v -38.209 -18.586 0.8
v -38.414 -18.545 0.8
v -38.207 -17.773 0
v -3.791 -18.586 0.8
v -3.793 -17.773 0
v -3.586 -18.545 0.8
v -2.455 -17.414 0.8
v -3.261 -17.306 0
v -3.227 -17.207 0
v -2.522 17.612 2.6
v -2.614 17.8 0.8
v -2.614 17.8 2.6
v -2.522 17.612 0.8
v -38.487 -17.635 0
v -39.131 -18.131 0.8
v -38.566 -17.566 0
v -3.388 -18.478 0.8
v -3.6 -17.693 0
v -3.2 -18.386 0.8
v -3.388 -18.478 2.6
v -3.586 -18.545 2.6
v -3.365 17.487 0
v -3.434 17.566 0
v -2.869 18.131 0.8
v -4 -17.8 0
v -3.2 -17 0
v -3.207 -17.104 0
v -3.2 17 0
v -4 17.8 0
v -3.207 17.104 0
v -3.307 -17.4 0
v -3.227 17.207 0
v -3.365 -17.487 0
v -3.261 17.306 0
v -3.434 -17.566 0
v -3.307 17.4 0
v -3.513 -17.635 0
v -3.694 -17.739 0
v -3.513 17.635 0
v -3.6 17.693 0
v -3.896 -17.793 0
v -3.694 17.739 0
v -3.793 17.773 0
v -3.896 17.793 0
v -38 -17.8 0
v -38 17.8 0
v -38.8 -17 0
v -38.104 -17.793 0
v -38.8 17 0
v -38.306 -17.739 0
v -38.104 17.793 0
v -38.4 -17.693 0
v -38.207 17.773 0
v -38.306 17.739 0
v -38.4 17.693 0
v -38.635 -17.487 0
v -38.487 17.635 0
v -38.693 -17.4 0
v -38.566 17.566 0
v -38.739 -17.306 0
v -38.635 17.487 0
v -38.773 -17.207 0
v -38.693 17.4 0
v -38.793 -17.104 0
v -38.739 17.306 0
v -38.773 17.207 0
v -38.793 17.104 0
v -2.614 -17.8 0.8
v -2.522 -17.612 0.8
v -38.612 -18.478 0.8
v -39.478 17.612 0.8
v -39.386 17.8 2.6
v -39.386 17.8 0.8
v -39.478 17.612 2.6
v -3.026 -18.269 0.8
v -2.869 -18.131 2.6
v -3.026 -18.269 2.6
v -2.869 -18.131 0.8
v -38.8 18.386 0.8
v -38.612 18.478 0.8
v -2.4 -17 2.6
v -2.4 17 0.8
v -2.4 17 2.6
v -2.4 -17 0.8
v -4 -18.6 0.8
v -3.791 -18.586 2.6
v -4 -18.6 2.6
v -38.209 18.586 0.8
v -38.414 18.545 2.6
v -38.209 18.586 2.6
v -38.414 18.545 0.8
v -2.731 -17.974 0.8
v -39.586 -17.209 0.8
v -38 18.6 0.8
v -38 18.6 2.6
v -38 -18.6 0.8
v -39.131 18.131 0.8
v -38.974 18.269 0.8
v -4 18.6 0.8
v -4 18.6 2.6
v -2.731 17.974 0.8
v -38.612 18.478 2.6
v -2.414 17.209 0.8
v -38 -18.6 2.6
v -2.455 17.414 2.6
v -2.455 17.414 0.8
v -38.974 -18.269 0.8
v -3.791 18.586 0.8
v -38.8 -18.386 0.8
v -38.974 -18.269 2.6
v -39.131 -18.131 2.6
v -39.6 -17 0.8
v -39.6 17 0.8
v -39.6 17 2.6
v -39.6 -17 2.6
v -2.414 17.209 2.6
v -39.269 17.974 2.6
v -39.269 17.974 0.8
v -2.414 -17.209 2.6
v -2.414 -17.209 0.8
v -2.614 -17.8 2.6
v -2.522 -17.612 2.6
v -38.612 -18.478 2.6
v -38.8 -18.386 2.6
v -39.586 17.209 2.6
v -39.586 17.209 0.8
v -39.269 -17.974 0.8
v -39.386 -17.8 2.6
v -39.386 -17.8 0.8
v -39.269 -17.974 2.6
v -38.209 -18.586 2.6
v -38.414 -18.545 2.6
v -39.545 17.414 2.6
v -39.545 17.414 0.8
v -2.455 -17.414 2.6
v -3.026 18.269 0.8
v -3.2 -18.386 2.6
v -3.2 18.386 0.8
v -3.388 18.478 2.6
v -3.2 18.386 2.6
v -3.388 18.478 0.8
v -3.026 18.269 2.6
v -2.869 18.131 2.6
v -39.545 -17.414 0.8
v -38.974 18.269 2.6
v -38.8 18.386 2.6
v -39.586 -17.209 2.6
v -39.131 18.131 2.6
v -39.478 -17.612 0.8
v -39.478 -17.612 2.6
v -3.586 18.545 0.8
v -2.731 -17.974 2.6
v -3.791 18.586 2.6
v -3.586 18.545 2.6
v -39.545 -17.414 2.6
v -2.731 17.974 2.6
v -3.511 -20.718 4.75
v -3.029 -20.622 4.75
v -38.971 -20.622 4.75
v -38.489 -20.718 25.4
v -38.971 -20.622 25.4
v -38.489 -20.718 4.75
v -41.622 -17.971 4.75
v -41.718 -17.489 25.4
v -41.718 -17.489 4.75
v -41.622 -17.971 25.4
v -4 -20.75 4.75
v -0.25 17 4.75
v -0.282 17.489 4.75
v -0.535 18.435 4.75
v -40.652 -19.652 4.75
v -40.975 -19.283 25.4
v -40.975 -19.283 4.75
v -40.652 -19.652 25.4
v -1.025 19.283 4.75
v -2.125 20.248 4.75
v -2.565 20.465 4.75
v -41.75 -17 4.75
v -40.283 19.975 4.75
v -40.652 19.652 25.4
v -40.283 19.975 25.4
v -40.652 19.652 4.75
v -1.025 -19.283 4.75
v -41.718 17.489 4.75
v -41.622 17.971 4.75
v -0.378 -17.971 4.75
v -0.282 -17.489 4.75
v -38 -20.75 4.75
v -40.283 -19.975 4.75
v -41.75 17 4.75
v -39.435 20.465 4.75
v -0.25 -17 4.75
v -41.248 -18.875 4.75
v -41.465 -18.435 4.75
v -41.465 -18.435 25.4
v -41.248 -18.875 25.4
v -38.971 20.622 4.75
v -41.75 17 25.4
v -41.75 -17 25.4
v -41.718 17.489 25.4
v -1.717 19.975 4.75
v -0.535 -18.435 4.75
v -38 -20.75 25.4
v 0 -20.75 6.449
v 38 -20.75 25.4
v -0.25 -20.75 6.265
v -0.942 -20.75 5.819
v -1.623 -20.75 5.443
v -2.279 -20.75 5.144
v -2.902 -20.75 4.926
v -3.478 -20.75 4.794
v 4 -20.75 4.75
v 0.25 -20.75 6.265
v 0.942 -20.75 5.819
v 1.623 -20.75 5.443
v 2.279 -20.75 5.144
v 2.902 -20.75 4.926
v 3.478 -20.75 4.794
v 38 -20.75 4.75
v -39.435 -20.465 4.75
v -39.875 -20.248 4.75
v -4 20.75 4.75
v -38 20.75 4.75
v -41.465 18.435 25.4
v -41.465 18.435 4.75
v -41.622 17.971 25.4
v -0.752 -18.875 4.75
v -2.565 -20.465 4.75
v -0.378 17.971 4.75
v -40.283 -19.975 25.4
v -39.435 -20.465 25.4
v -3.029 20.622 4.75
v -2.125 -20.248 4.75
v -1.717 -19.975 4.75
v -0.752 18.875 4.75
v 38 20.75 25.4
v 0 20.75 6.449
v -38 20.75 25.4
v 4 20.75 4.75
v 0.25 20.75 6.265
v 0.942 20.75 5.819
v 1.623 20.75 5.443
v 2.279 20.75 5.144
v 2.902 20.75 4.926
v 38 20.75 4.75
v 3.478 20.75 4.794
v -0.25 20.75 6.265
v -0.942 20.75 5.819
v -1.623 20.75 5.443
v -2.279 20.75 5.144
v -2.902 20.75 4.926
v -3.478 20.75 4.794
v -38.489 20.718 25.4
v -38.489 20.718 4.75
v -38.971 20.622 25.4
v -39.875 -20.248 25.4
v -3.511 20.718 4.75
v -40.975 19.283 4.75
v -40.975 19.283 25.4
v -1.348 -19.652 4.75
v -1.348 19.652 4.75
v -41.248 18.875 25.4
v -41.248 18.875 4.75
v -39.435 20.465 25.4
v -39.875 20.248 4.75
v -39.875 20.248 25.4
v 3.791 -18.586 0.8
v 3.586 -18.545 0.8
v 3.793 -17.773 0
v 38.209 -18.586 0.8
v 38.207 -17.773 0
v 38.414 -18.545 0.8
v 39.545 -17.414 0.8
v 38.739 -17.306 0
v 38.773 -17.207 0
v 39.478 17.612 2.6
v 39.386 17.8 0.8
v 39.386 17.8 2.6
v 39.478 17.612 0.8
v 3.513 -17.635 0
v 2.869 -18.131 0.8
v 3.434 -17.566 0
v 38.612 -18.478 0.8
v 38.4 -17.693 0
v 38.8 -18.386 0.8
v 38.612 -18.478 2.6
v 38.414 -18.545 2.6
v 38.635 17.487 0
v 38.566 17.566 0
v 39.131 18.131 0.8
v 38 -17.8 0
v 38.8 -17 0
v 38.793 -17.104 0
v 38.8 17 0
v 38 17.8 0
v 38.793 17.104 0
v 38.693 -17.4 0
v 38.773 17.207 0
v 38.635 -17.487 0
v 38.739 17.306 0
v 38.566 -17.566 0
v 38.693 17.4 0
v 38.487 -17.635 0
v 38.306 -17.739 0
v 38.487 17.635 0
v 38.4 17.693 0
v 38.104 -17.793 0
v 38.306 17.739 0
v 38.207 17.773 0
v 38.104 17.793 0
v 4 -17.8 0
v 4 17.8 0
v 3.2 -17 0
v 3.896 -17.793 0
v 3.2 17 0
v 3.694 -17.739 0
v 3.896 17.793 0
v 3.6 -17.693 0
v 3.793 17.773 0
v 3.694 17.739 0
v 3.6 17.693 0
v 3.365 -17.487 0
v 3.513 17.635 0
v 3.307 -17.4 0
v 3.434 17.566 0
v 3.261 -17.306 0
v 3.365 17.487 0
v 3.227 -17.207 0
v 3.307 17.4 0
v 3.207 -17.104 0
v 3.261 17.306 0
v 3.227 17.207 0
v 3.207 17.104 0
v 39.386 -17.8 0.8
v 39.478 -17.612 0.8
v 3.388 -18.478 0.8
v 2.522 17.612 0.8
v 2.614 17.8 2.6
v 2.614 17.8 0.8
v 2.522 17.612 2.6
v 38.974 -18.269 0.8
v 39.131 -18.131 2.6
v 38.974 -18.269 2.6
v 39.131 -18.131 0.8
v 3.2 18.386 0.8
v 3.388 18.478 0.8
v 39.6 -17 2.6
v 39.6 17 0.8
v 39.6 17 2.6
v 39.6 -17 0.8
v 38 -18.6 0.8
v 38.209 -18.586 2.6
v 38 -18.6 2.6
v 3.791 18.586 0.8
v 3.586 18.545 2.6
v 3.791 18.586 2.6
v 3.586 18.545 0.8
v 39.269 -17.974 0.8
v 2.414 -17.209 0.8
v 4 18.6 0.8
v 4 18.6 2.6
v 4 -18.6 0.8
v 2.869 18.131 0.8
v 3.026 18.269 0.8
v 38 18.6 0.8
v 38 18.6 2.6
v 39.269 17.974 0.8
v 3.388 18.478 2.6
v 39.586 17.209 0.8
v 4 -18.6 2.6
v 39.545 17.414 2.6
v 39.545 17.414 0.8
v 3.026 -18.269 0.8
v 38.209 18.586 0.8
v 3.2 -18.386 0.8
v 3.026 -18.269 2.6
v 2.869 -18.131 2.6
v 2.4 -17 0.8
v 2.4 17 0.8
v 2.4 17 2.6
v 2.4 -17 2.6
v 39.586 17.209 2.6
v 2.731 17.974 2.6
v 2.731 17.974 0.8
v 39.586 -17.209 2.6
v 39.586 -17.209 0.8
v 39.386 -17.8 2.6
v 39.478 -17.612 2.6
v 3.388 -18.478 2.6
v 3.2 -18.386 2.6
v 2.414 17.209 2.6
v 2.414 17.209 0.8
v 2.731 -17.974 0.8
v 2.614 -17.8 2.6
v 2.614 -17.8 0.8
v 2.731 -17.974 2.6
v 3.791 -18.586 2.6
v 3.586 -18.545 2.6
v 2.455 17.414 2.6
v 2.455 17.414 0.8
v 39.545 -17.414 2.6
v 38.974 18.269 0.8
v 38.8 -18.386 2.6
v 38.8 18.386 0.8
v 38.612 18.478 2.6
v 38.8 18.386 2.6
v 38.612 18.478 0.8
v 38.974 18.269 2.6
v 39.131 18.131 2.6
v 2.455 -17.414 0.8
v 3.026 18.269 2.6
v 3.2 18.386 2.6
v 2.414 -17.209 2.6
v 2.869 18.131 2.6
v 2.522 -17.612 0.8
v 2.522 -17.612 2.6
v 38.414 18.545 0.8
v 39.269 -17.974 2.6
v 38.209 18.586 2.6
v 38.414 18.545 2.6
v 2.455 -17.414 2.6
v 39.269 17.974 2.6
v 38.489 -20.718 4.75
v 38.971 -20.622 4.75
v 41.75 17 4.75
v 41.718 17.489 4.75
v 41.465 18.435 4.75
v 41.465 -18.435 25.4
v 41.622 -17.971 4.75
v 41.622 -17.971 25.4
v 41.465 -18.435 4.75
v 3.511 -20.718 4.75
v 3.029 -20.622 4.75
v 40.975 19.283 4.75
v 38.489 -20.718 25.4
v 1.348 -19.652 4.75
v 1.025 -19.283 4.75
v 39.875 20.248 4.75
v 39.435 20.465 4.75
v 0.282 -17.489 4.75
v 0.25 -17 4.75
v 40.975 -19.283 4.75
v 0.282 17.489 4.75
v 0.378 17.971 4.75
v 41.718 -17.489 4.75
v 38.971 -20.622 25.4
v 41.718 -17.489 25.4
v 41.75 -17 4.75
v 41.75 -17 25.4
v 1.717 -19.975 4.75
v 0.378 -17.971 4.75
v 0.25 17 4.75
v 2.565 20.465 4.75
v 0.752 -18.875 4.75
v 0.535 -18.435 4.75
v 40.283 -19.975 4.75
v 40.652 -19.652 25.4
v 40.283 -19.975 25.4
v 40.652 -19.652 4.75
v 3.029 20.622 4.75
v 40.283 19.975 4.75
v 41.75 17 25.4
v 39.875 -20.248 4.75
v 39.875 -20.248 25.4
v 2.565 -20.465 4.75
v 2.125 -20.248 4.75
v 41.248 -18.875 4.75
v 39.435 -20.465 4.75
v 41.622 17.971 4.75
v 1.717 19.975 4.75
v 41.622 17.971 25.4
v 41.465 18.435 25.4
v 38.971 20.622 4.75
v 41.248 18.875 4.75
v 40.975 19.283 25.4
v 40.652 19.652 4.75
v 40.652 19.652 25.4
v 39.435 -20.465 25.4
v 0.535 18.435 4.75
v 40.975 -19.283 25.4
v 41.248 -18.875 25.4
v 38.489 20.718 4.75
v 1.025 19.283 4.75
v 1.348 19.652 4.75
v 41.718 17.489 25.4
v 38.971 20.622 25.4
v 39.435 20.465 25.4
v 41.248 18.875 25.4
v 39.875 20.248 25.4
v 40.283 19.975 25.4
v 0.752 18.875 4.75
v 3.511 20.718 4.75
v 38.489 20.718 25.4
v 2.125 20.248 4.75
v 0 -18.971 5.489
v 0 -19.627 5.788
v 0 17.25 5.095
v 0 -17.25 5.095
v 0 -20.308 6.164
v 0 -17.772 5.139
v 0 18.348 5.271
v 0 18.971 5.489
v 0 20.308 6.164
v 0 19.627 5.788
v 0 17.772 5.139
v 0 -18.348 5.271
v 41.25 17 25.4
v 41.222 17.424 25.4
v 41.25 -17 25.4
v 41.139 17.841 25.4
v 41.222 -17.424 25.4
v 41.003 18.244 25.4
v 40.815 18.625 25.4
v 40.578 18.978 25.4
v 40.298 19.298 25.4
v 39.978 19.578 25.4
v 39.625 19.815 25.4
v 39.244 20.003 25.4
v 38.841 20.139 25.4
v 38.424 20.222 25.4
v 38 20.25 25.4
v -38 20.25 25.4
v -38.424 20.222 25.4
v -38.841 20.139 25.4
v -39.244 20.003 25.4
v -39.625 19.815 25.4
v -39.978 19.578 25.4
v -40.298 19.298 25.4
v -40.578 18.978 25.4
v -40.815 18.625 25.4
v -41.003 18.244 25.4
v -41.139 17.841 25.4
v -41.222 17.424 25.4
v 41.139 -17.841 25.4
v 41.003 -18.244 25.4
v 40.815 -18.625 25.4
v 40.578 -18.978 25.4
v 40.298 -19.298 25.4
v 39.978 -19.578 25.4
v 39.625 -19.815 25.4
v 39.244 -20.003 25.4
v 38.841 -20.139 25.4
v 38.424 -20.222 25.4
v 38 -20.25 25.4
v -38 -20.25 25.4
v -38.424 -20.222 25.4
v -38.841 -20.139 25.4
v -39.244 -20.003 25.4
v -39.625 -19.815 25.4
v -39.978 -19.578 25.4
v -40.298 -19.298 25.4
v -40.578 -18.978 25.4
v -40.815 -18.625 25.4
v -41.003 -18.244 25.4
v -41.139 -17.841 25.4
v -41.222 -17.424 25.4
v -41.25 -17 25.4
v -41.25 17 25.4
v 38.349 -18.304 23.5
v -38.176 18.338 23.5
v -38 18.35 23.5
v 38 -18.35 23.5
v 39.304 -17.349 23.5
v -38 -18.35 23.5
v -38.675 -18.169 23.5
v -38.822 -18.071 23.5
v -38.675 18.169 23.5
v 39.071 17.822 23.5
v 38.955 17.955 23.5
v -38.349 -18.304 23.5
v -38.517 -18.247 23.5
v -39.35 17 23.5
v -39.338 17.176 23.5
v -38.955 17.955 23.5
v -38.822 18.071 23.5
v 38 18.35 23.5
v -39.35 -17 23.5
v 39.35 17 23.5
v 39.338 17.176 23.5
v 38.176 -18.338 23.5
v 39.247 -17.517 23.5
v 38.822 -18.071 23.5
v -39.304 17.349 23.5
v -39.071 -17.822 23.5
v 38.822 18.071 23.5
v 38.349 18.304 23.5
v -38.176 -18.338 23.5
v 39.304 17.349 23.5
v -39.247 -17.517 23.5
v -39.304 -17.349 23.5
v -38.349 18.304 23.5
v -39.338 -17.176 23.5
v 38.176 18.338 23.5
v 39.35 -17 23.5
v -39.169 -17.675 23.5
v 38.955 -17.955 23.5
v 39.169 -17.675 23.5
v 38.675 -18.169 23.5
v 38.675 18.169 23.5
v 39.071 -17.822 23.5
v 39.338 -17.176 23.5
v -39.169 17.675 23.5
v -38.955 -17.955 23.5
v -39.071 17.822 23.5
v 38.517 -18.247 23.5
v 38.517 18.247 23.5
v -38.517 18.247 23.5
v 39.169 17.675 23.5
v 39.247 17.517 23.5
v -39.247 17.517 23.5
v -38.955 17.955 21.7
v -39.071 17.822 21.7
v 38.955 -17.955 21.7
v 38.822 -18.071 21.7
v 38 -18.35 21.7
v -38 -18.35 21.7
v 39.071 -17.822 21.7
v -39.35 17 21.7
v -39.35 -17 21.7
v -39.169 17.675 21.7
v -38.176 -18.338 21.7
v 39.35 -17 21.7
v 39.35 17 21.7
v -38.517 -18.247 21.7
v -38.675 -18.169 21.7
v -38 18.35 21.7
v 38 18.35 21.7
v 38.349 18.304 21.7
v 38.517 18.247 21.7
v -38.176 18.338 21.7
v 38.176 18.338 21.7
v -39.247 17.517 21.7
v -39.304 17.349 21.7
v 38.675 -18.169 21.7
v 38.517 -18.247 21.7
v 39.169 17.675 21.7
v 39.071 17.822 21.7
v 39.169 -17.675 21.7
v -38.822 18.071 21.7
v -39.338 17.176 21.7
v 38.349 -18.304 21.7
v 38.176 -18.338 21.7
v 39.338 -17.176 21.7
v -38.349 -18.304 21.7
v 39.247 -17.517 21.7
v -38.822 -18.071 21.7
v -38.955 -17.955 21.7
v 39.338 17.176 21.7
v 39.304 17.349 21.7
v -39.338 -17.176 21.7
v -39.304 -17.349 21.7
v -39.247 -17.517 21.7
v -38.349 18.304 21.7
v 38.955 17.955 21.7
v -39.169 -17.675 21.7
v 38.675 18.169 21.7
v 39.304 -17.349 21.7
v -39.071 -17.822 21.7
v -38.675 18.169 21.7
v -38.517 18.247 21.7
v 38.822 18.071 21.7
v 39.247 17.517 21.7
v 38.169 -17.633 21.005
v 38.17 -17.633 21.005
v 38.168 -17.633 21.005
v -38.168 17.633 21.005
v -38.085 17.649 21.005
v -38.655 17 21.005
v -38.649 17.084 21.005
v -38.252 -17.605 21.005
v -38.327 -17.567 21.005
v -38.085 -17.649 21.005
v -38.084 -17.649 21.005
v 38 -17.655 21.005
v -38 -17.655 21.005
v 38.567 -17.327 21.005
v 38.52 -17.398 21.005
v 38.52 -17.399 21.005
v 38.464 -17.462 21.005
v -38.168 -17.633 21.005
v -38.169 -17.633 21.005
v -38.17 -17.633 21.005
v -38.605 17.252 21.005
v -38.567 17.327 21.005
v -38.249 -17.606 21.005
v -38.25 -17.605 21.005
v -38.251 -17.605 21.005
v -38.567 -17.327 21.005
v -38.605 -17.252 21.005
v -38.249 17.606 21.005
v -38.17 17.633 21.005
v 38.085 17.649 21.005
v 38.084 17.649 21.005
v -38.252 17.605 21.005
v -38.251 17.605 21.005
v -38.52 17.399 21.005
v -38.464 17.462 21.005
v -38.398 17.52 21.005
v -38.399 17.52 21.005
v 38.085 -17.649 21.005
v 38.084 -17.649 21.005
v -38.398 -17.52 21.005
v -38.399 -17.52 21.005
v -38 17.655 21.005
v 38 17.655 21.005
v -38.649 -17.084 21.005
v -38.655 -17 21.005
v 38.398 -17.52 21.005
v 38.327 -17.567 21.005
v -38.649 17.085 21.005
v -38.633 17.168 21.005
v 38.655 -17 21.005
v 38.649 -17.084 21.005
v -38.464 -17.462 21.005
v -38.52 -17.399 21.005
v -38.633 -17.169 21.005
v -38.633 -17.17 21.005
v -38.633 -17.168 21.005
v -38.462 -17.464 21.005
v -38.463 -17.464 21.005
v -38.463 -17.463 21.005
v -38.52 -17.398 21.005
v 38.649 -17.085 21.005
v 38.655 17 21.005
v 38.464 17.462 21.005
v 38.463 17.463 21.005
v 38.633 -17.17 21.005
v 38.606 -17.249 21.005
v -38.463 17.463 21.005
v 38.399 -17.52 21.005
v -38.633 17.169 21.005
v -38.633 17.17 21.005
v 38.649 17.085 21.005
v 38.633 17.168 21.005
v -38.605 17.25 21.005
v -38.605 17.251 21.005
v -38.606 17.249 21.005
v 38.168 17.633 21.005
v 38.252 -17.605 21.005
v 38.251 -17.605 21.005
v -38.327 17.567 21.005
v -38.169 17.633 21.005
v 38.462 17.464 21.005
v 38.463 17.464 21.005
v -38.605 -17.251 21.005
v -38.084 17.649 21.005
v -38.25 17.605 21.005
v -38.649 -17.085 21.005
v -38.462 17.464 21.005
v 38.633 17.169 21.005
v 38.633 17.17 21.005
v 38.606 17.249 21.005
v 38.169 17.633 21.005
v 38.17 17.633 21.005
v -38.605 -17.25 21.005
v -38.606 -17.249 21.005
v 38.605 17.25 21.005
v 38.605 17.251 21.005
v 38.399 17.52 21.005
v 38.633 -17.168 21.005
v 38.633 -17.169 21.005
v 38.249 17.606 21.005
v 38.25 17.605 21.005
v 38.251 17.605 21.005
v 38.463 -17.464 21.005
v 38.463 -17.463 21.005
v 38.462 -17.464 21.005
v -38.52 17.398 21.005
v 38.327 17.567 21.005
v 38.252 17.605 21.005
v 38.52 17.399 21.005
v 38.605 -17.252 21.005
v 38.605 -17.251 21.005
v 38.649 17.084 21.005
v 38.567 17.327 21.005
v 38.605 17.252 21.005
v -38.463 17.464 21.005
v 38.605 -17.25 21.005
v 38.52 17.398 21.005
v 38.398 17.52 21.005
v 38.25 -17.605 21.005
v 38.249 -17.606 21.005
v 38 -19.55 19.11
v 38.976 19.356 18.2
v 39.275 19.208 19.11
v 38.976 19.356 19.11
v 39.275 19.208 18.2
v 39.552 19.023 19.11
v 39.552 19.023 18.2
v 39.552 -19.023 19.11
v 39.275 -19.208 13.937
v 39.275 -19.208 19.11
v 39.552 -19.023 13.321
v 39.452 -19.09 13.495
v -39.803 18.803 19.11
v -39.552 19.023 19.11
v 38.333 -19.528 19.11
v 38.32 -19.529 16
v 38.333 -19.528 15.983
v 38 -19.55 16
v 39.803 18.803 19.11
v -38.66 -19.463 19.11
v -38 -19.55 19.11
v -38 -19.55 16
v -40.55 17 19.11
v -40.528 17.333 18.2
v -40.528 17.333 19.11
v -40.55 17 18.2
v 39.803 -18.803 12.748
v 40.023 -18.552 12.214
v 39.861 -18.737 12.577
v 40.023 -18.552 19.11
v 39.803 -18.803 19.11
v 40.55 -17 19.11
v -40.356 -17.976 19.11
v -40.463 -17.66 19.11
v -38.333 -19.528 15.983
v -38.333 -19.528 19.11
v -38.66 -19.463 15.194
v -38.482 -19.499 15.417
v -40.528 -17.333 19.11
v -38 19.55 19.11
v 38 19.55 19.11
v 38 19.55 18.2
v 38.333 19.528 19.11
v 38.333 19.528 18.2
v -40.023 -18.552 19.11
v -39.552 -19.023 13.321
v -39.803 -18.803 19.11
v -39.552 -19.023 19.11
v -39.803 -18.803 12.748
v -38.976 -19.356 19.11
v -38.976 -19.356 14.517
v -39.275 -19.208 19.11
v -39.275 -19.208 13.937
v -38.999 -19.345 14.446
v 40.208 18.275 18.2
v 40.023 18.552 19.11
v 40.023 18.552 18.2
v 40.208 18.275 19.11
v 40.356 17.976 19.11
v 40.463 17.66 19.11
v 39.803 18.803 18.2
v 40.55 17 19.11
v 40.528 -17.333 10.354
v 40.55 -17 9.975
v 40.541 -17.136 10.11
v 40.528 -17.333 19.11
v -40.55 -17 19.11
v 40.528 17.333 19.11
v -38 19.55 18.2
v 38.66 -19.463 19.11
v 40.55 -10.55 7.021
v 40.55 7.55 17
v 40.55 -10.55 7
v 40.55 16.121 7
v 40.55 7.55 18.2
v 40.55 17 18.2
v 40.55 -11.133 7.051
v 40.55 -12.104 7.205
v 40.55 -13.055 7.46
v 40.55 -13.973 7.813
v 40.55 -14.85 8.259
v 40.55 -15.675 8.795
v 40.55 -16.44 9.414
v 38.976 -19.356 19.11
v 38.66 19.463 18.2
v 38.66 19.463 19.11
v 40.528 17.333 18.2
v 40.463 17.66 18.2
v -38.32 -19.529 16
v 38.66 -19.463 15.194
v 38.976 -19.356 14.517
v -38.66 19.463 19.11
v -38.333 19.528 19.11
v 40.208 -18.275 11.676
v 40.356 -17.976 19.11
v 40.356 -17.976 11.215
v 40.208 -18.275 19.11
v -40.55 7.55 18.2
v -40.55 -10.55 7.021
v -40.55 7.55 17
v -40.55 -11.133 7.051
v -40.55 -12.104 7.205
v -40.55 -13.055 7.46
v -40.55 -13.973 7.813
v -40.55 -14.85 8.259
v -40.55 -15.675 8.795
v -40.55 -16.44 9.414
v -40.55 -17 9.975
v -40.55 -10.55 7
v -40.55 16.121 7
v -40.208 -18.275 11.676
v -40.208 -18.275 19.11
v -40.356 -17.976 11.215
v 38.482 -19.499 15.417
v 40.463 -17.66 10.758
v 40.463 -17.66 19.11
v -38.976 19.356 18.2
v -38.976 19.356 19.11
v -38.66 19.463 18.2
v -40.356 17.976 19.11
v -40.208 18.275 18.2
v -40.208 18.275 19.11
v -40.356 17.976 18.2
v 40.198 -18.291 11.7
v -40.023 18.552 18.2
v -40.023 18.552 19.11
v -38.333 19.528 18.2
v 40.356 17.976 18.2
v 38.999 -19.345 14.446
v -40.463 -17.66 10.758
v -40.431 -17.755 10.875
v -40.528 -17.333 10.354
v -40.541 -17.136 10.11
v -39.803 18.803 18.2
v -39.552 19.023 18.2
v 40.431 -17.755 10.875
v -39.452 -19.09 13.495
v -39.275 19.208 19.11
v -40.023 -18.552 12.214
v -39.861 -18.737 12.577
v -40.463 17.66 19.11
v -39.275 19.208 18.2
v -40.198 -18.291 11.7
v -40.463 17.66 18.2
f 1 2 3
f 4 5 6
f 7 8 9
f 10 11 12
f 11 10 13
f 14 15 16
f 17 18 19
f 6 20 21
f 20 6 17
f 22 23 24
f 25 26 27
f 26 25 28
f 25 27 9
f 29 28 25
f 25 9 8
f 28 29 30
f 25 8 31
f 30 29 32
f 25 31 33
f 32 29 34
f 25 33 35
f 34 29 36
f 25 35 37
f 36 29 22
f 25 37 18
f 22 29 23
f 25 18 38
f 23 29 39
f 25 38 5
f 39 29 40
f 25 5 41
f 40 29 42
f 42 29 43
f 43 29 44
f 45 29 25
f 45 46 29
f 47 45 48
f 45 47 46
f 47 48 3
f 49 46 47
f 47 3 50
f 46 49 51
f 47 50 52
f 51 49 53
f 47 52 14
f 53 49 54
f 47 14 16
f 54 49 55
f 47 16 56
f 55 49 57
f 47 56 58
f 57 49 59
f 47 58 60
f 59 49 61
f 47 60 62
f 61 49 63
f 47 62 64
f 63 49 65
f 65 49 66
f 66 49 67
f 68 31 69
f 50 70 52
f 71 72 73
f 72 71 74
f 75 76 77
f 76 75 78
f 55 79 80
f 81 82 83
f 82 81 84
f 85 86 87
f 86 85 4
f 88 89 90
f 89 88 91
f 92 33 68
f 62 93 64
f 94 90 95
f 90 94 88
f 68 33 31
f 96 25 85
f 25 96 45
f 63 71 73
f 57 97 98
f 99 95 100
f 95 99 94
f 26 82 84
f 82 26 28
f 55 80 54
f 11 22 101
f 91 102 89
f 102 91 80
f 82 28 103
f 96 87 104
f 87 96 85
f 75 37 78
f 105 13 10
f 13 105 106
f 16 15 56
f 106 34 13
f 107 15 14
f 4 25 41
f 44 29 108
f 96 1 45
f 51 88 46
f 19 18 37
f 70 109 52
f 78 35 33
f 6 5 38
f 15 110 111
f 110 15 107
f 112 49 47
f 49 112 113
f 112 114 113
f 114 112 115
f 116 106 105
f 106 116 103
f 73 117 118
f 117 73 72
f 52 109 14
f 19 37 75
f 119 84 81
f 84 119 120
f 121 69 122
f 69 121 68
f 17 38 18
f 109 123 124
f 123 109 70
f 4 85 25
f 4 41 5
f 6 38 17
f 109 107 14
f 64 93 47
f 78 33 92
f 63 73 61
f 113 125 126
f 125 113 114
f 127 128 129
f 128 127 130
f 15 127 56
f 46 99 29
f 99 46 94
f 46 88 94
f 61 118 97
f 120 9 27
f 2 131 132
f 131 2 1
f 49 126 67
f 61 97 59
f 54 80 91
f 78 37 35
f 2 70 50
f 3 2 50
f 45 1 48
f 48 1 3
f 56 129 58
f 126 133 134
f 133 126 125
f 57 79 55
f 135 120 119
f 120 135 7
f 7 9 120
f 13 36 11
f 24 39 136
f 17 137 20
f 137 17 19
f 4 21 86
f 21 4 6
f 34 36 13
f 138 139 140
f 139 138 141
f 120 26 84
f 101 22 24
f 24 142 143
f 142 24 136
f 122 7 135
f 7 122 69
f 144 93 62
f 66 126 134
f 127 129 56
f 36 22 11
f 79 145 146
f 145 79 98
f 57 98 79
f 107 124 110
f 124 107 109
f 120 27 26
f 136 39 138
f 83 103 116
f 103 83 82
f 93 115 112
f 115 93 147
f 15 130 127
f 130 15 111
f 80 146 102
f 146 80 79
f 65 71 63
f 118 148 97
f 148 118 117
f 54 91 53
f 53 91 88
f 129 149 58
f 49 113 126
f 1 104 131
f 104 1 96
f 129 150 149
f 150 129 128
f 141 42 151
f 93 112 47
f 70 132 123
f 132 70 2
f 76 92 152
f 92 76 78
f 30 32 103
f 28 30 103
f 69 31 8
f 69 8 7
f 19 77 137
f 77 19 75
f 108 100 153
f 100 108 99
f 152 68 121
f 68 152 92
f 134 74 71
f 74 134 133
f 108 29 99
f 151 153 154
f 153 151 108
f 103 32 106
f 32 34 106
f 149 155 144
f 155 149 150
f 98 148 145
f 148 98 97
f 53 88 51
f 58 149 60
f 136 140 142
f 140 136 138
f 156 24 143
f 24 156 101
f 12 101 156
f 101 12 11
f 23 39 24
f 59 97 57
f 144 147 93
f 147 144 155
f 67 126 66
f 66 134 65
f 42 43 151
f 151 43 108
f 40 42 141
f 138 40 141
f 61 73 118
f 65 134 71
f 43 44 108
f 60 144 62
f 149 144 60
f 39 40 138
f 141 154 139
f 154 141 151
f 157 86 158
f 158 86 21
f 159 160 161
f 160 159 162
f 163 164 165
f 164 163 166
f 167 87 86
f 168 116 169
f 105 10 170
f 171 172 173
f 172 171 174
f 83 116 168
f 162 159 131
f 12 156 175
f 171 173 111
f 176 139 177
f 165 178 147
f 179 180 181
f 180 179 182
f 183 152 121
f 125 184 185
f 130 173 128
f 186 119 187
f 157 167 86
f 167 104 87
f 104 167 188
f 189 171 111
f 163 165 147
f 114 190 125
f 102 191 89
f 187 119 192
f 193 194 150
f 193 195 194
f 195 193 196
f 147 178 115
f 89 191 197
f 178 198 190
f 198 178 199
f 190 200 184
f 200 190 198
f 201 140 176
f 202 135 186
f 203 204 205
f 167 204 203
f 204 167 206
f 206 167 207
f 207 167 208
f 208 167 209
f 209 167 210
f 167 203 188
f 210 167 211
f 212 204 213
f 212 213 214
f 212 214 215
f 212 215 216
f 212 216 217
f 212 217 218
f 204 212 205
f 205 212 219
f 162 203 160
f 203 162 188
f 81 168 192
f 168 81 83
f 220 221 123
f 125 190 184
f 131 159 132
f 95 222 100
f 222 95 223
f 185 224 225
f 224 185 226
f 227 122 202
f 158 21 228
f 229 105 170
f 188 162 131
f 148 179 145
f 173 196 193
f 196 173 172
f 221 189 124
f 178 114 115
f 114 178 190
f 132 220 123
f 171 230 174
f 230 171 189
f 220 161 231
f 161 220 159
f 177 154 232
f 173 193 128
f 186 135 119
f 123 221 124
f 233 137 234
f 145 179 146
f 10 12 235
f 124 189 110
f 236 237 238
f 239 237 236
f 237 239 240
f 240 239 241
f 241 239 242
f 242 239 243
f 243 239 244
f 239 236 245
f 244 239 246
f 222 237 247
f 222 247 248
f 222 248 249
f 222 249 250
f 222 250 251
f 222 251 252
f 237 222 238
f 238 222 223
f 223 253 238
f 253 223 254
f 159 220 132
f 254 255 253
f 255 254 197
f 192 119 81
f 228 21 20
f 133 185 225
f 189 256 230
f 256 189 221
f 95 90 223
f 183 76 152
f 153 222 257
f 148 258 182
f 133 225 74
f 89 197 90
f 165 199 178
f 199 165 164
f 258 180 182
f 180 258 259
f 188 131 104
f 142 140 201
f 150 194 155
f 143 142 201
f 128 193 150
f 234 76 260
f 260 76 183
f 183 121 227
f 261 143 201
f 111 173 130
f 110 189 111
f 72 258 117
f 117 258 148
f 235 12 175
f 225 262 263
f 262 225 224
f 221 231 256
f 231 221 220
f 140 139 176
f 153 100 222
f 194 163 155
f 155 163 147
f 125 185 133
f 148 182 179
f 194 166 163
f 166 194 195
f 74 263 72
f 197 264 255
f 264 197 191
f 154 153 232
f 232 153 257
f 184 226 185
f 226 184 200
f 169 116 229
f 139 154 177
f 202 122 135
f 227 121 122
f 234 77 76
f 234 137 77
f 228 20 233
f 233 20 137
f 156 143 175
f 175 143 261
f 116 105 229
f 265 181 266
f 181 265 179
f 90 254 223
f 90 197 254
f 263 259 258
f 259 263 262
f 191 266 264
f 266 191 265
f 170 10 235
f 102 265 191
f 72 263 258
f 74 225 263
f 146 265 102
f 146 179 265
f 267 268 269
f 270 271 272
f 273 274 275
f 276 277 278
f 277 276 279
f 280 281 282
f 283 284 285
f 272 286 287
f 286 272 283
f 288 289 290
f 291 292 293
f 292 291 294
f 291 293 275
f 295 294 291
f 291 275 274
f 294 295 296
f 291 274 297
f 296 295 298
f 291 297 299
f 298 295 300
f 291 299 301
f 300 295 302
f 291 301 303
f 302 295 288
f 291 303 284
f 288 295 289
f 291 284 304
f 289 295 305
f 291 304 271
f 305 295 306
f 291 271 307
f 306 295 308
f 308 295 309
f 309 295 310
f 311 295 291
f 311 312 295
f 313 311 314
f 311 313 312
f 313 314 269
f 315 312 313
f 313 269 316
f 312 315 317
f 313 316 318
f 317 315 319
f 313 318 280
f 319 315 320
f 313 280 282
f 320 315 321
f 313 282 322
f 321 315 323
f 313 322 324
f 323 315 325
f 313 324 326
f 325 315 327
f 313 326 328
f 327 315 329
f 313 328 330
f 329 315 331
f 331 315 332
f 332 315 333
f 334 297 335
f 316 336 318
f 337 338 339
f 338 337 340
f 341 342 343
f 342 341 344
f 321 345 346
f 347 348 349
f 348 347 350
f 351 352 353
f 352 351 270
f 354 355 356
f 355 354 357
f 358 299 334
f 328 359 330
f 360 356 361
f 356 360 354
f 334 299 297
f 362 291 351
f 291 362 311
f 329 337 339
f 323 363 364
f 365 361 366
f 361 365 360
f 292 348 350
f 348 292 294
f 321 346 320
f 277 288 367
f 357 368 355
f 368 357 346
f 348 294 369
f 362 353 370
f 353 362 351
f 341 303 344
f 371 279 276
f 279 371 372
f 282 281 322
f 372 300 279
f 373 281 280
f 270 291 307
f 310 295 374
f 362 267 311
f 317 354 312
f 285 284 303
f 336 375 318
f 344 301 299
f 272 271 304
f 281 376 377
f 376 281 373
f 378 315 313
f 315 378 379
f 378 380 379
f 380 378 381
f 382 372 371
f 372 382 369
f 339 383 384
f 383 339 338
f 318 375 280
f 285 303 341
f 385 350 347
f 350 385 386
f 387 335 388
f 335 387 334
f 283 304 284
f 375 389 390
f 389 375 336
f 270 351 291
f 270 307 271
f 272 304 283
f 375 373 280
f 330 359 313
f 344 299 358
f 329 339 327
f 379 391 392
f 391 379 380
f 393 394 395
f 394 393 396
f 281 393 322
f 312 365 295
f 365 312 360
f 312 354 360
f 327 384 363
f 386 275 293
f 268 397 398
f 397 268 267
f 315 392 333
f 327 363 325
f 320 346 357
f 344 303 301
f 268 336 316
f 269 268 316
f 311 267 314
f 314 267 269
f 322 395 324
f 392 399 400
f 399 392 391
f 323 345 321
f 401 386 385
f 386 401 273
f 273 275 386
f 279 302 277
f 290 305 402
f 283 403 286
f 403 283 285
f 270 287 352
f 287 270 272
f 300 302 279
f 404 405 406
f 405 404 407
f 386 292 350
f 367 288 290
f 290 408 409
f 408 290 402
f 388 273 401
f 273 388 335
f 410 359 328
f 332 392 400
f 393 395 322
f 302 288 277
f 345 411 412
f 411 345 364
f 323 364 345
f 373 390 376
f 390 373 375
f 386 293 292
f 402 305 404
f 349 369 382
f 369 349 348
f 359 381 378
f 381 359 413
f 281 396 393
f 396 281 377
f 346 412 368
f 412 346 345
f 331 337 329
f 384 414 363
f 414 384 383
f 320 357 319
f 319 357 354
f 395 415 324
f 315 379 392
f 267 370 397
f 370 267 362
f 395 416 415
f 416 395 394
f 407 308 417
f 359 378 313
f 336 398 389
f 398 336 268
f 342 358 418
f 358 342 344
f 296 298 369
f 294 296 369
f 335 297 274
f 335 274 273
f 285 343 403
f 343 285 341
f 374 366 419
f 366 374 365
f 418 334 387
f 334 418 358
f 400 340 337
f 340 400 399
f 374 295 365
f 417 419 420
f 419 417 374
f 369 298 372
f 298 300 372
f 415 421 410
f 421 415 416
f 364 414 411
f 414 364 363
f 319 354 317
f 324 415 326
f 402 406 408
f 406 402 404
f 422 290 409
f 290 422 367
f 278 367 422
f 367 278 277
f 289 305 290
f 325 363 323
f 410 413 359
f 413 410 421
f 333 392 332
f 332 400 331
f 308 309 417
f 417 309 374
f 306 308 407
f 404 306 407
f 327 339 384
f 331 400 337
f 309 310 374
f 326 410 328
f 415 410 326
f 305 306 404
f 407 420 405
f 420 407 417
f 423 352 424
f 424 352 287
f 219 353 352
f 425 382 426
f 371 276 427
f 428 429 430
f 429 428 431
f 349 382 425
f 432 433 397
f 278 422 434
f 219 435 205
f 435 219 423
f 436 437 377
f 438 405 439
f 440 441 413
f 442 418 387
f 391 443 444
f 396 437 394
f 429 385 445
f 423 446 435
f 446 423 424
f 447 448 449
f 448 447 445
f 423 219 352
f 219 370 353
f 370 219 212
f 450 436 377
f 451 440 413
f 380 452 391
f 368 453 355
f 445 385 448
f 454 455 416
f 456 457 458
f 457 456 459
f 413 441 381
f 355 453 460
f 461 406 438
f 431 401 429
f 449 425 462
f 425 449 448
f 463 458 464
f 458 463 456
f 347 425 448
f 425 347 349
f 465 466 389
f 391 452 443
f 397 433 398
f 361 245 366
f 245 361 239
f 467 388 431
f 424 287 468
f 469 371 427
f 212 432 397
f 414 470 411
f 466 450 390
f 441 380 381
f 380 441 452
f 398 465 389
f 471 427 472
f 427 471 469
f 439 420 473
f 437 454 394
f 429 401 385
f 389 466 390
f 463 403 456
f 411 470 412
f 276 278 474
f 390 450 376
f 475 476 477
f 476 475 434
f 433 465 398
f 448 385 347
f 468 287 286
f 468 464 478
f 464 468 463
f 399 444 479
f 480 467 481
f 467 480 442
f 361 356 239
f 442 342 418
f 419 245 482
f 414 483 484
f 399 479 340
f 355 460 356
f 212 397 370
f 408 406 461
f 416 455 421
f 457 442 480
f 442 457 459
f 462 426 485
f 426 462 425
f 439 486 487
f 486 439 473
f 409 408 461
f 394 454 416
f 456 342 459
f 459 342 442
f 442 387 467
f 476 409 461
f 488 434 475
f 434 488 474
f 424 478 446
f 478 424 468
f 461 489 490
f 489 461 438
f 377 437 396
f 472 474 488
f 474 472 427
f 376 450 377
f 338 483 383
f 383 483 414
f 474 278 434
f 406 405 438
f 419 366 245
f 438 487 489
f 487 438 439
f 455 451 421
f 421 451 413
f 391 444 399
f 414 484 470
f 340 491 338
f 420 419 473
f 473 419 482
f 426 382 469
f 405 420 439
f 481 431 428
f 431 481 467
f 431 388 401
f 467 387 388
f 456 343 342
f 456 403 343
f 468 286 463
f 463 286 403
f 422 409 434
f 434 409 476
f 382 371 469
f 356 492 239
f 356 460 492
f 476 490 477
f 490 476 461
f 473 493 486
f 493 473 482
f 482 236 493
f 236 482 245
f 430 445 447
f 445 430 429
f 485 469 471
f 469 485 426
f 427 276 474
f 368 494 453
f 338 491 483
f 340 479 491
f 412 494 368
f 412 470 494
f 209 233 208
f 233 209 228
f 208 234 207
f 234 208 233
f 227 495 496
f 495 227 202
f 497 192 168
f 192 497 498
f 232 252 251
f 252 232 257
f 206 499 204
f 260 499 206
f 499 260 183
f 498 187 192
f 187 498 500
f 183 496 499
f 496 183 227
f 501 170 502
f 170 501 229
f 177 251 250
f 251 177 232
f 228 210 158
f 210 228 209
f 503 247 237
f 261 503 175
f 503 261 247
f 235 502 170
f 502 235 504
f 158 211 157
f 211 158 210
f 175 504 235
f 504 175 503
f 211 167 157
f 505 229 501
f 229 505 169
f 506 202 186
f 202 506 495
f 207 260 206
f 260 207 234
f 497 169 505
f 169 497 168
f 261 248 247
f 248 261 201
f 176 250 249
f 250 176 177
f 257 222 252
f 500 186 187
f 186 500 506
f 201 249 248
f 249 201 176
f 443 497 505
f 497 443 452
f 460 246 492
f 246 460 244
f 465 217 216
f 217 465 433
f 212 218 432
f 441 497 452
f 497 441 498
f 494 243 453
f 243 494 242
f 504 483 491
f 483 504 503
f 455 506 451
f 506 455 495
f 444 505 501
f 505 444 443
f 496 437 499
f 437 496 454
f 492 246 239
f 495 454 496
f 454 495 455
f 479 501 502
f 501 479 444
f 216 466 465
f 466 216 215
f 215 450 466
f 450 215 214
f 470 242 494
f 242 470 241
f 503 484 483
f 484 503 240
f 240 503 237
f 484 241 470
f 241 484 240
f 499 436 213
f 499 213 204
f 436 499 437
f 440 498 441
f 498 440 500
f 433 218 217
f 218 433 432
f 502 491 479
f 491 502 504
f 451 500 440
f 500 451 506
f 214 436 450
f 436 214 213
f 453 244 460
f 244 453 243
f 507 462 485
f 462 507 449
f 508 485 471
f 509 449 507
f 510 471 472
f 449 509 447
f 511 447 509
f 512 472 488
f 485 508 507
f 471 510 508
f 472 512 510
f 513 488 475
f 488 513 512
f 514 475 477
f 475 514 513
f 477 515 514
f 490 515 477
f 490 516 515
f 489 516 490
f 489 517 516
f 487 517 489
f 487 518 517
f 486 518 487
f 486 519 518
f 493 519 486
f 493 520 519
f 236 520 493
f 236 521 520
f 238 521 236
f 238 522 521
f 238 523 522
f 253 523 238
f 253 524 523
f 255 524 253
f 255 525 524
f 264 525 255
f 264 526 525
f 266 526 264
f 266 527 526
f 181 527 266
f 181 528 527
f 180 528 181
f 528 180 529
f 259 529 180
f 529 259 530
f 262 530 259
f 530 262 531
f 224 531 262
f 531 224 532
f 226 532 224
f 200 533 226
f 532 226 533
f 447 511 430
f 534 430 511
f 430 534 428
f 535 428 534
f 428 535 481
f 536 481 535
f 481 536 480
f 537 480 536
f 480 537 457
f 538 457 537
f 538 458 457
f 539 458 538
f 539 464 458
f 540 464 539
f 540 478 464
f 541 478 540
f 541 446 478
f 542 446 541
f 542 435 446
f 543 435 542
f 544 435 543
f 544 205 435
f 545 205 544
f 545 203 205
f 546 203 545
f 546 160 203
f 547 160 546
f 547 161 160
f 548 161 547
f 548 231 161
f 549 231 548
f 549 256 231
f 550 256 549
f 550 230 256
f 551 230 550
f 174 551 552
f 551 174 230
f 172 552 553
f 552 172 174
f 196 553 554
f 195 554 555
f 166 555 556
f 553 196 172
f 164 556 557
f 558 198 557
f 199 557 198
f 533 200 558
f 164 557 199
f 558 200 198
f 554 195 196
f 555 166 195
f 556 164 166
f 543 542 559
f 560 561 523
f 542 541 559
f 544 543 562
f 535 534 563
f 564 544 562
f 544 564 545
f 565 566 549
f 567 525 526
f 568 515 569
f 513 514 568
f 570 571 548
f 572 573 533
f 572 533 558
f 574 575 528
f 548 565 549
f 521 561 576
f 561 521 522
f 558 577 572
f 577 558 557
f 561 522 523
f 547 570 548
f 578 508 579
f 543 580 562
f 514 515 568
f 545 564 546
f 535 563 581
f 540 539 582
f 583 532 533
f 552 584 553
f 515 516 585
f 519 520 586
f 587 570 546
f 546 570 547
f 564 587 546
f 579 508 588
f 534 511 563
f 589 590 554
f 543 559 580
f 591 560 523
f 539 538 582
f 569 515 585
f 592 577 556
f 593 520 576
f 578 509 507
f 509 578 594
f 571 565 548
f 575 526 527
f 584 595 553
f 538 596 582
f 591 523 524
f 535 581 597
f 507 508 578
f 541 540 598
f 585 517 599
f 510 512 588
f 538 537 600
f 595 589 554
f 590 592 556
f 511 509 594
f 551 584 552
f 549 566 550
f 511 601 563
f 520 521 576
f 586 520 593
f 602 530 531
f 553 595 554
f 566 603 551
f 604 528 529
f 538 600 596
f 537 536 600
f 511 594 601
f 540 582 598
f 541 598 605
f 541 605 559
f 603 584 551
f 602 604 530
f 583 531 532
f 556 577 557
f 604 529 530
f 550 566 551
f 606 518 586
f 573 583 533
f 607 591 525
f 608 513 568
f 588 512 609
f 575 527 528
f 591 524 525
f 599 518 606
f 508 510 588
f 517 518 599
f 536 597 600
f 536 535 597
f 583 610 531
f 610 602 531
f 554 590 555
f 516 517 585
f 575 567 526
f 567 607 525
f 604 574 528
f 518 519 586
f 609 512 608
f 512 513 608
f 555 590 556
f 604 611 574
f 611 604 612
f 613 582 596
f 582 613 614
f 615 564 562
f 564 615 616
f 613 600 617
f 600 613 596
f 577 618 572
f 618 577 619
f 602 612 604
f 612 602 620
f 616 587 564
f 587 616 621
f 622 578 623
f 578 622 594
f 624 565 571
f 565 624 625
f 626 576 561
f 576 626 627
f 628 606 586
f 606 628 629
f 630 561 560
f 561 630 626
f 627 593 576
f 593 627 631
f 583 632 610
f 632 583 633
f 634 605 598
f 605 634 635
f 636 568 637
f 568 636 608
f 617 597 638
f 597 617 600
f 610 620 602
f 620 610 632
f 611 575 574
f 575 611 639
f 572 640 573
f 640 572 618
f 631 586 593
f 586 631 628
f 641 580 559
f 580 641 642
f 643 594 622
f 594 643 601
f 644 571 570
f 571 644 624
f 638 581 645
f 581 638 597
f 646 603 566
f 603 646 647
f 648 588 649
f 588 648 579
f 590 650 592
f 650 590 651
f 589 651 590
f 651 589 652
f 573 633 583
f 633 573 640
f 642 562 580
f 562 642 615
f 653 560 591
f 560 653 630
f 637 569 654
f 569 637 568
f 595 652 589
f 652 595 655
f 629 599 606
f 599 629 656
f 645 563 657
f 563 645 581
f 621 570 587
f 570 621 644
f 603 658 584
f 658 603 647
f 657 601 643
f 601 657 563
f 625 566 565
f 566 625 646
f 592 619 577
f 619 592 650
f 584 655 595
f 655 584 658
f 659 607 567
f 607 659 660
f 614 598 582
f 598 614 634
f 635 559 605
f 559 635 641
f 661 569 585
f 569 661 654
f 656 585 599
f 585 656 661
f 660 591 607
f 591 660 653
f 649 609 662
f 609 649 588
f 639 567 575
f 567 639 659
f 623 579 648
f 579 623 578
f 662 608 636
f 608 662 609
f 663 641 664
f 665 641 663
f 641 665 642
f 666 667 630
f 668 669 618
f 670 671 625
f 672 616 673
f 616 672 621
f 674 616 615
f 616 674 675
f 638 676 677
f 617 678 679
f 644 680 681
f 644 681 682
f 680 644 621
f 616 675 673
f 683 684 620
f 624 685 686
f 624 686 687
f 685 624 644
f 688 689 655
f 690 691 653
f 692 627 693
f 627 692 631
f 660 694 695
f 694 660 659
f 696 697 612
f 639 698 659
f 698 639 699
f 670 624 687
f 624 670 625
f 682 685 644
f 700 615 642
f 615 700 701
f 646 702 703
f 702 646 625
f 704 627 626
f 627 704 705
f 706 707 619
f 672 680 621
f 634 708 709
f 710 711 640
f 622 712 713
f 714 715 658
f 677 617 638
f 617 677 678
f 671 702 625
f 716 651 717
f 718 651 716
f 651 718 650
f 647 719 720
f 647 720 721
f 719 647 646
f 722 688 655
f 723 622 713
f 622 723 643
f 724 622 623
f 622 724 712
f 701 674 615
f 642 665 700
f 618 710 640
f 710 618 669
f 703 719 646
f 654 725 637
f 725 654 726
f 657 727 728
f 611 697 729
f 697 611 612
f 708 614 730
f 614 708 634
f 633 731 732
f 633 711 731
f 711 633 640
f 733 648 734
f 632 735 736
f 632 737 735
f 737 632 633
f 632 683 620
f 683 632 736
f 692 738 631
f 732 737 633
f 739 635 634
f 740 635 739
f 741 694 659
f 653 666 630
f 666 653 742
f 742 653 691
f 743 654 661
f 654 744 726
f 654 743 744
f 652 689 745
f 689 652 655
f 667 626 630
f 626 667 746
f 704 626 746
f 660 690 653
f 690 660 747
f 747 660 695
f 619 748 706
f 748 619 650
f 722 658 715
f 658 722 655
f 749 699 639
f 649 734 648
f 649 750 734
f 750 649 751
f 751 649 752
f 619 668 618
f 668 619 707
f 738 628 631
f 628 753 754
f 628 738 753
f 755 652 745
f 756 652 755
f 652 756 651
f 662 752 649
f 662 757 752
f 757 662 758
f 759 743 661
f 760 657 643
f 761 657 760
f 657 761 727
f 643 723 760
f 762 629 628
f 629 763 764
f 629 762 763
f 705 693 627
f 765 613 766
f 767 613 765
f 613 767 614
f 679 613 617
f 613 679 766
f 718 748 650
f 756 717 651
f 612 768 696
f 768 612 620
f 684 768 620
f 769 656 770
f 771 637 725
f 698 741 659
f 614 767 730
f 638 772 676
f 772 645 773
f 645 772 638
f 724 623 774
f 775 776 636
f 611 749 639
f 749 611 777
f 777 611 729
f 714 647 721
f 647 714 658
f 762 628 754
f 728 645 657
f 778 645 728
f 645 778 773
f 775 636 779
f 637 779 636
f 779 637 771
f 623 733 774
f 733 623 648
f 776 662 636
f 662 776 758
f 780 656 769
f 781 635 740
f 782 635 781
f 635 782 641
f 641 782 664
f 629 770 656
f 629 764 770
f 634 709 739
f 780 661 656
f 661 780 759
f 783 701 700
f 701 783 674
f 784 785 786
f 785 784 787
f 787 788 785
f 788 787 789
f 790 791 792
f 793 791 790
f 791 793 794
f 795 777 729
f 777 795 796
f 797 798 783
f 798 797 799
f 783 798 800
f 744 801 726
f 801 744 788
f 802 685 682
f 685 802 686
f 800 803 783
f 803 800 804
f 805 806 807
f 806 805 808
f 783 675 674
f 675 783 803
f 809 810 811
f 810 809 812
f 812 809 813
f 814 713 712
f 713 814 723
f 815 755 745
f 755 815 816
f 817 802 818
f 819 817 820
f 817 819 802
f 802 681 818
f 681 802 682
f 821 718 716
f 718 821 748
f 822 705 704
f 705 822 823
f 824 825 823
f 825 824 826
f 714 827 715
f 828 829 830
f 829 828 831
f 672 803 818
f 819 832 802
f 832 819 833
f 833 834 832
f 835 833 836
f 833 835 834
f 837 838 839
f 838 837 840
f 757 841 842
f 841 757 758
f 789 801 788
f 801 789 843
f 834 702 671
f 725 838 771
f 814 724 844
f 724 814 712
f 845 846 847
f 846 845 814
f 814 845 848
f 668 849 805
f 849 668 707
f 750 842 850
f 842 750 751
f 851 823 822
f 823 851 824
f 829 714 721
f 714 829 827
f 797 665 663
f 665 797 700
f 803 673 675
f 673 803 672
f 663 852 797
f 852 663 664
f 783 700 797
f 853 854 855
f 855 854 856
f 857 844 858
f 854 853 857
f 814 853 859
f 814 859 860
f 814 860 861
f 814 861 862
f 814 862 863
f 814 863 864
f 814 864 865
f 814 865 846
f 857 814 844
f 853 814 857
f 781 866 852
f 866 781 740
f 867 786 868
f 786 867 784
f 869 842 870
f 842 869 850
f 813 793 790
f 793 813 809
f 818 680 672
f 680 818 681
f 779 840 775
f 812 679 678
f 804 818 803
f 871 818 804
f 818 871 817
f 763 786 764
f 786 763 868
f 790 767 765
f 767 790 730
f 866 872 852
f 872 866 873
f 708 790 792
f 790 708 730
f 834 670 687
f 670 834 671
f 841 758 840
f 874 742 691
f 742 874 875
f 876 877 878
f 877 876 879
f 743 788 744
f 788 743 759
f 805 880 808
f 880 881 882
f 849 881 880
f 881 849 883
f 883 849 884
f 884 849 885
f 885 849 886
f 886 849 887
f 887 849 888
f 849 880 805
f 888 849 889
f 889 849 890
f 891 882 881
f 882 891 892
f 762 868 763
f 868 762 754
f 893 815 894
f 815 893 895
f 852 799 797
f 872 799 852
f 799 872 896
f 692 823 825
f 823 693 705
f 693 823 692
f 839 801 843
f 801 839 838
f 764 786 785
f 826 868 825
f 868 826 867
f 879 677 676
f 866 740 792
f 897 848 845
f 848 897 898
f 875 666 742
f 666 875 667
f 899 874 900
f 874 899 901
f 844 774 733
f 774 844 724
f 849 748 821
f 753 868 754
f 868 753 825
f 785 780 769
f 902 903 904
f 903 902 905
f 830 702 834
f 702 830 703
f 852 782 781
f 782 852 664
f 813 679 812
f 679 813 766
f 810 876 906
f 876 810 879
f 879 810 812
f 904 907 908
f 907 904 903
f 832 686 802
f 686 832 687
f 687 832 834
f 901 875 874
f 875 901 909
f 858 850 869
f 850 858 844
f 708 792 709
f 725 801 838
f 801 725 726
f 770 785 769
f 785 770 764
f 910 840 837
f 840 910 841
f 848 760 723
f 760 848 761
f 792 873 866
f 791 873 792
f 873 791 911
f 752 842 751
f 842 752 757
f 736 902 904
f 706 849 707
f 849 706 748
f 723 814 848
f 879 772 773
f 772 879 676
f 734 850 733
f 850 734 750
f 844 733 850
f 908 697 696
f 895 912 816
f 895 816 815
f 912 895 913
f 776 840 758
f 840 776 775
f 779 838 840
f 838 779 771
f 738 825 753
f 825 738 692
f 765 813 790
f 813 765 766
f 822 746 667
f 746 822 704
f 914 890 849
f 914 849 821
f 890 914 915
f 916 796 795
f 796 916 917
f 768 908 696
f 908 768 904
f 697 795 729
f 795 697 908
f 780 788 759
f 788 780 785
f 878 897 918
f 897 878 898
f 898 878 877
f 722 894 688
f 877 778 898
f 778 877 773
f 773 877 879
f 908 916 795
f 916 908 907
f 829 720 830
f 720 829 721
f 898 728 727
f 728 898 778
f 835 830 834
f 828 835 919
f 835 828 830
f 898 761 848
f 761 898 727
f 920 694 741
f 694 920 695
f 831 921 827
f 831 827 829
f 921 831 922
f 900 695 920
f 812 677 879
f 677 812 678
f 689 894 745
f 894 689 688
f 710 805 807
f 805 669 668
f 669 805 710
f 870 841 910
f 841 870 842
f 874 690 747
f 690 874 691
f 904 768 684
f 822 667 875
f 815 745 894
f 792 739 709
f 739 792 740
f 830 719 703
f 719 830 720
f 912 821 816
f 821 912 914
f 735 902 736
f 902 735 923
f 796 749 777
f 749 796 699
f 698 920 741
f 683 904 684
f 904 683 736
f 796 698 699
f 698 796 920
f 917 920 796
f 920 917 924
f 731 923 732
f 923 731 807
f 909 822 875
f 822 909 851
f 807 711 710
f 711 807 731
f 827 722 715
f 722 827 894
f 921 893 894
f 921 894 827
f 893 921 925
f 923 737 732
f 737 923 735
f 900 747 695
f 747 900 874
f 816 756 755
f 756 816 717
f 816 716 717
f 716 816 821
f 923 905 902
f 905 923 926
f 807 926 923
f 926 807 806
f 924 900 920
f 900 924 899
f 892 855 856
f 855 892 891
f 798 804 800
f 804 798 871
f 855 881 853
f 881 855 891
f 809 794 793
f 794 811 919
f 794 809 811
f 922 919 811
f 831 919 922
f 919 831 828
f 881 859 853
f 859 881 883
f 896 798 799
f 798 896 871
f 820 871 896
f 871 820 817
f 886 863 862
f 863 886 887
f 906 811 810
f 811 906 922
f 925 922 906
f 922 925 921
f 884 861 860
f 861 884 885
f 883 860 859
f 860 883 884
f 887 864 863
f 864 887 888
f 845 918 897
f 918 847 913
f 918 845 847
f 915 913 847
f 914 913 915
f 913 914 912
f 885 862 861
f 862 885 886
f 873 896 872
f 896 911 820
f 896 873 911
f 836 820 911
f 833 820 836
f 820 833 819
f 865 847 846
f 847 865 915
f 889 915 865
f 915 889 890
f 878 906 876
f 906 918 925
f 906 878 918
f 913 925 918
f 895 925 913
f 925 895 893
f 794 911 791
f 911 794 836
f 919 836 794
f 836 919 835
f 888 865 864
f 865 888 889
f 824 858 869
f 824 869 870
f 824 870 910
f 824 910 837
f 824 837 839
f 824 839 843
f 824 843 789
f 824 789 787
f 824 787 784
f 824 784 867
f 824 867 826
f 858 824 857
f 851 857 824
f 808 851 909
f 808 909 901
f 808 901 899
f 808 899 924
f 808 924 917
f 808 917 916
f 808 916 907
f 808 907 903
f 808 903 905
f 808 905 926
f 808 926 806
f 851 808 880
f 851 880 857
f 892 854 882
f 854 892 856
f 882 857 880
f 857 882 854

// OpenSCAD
// Gridfinity-compatible storage bin - original parametric model (Brian Sacco)
// Independent implementation of the open Gridfinity standard (Zack Freedman):
//   grid 42 mm, bin footprint 41.5 mm (0.25 mm clearance per side), height unit 7 mm,
//   total height = 7 mm x units (base included) + 4.4 mm stacking lip,
//   foot profile from the bottom: 0.8 mm @45°, 1.8 mm vertical, 2.15 mm @45° (4.75 mm),
//   foot outline 35.6 -> 37.2 -> 41.5 mm, corner radii 0.8 / 1.6 / 3.75 mm.
gx        = 2;      // grid units in X
gy        = 1;      // grid units in Y
gz        = 3;      // height units (7 mm each, base included)
dividers  = 0;      // internal dividers along X
label     = true;   // label shelf on the back wall
scoop     = true;   // curved front floor to scoop small parts
wall      = 1.2;
insert    = "none"; // "none", "bits" (1/4" hex bits), "aa", "aaa" (batteries)
$fn = 48;

pitch = 42; clr = 0.5; r_out = 3.75;
W = gx*pitch - clr; D = gy*pitch - clr;
TOP = 7 * gz;              // top of the walls (lip starts here)
base_h = 5;                // 4.75 mm foot profile + 0.25 mm straight
floor_z = 7;               // inner floor: usable depth = (units - 1) x 7 mm, as in the standard
LIP = 4.4;

module rrect(w, d, h, r) { linear_extrude(h) offset(r) offset(-r) square([w, d], center=true); }
module ring(w, d, r, z) { translate([0, 0, z]) rrect(w, d, 0.01, r); }

module foot() {
    hull() { ring(35.6, 35.6, 0.8, 0);   ring(37.2, 37.2, 1.6, 0.8); }
    hull() { ring(37.2, 37.2, 1.6, 0.8); ring(37.2, 37.2, 1.6, 2.6); }
    hull() { ring(37.2, 37.2, 1.6, 2.6); ring(41.5, 41.5, r_out, 4.75); }
    translate([0, 0, 4.75]) rrect(41.5, 41.5, base_h - 4.75 + 0.01, r_out);
}

// Stacking lip: inner surface mirrors the baseplate profile so the next bin's feet seat in it.
// Insets from the outer wall, top to bottom: 0.5 flat, 1.9 @45°, 1.8 vertical, 0.7 @45°.
module lip_cut() {
    a0 = 0.5; a1 = a0 + 1.9; a2 = a1 + 0.7;
    r = function(a) max(0.4, r_out - a);
    hull() { ring(W-2*a0, D-2*a0, r(a0), TOP+LIP+0.1); ring(W-2*a0, D-2*a0, r(a0), TOP+LIP); ring(W-2*a1, D-2*a1, r(a1), TOP+LIP-1.9); }
    hull() { ring(W-2*a1, D-2*a1, r(a1), TOP+LIP-1.9); ring(W-2*a1, D-2*a1, r(a1), TOP+LIP-3.7); }
    hull() { ring(W-2*a1, D-2*a1, r(a1), TOP+LIP-3.7); ring(W-2*a2, D-2*a2, r(a2), TOP); }
    // 45° chamfer under the lip ledge back out to the inner wall (self-supporting)
    hull() { ring(W-2*a2, D-2*a2, r(a2), TOP); ring(W-2*wall, D-2*wall, r_out-wall, TOP-(a2-wall)); }
}

union() {
    difference() {
        union() {
            for (i=[0:gx-1], j=[0:gy-1]) translate([(i-(gx-1)/2)*pitch, (j-(gy-1)/2)*pitch, 0]) foot();
            // multi-unit: the solid body starts where the flares below have closed every gap
            translate([0, 0, gx * gy > 1 ? 6.75 : base_h]) rrect(W, D, TOP + LIP - (gx * gy > 1 ? 6.75 : base_h), r_out);
            // between feet (multi-unit bins): ~54° flare above the foot top (z 4.75, higher than the
            // baseplate ridge at 4.65) so the gaps close with pointed roofs, steeper than 45°, never a flat ceiling
            if (gx * gy > 1) intersection() {
                rrect(W, D, floor_z, r_out);
                for (i=[0:gx-1], j=[0:gy-1]) translate([(i-(gx-1)/2)*pitch, (j-(gy-1)/2)*pitch, 0])
                    hull() { ring(41.5, 41.5, r_out, 4.75); ring(44.4, 44.4, r_out, 6.75); }   // 1.45 out over 2 up (~54°)
            }
        }
        // cavity up to the lip, then the lip profile
        translate([0, 0, floor_z]) rrect(W-2*wall, D-2*wall, TOP - floor_z - (3.1 - wall) + 0.01, r_out-wall);  // meets the 45° chamfer under the lip (a2 = 3.1): no flat ceiling
        lip_cut();
    }
    // scoop, dividers, label shelf (fused to walls and floor)
    intersection() {
        translate([0, 0, floor_z - 0.6]) rrect(W-2*wall+1, D-2*wall+1, TOP - floor_z, r_out-wall);
        union() {
            if (scoop) translate([0, -(D/2-wall), floor_z]) difference() {
                translate([-W/2, -0.6, -0.6]) cube([W, 9.6, 9.6]);
                translate([-W/2-1, 9.4, 9.4]) rotate([0,90,0]) cylinder(r=9.4, h=W+2, $fn=60);
            }
            if (dividers > 0) for (k=[1:dividers])
                translate([-W/2 + k*W/(dividers+1) - wall/2, -D/2, floor_z - 0.6]) cube([wall, D, (TOP - floor_z)*0.85]);
            if (label) translate([-W/2, D/2 - wall - 12, TOP - 4]) hull() {
                cube([W, 12, 1.2]);
                translate([0, 12, -14]) cube([W, 0.5, 1]);   // underside ~50°, bottom edge buried in the back wall: self-supporting
            }
        }
    }
    // ---- specialised inserts: a block with a grid of holes sized to the item's standard
    //   1/4" hex bit: 6.35 mm across flats -> 6.75 mm hole (0.4 mm FDM clearance)
    //   AA (IEC LR6, max Ø 14.5 mm) -> 15.1 mm   |   AAA (IEC LR03, max Ø 10.5 mm) -> 11.1 mm
    if (insert != "none") {
        af    = 6.35 + 0.40;
        hole  = insert == "bits" ? af / cos(30) : insert == "aa" ? 15.1 : 11.1;
        pitch_h = insert == "bits" ? 10 : insert == "aa" ? 17 : 13;
        blk_h = insert == "bits" ? 12 : insert == "aa" ? 22 : 18;
        depth = blk_h - 1.6;
        nx = floor((W - 2*wall - 4) / pitch_h); ny = floor((D - 2*wall - 4) / pitch_h);
        echo(str("HOLES=", nx * ny));
        difference() {
            translate([0, 0, floor_z - 0.6]) rrect(W-2*wall+1, D-2*wall+1, blk_h, r_out-wall);
            for (i=[0:nx-1], j=[0:ny-1])
                translate([(i-(nx-1)/2)*pitch_h, (j-(ny-1)/2)*pitch_h, floor_z - 0.6 + blk_h - depth])
                    rotate([0, 0, 30]) cylinder(d=hole, h=depth+1, $fn = insert == "bits" ? 6 : 64);
        }
    }
}
